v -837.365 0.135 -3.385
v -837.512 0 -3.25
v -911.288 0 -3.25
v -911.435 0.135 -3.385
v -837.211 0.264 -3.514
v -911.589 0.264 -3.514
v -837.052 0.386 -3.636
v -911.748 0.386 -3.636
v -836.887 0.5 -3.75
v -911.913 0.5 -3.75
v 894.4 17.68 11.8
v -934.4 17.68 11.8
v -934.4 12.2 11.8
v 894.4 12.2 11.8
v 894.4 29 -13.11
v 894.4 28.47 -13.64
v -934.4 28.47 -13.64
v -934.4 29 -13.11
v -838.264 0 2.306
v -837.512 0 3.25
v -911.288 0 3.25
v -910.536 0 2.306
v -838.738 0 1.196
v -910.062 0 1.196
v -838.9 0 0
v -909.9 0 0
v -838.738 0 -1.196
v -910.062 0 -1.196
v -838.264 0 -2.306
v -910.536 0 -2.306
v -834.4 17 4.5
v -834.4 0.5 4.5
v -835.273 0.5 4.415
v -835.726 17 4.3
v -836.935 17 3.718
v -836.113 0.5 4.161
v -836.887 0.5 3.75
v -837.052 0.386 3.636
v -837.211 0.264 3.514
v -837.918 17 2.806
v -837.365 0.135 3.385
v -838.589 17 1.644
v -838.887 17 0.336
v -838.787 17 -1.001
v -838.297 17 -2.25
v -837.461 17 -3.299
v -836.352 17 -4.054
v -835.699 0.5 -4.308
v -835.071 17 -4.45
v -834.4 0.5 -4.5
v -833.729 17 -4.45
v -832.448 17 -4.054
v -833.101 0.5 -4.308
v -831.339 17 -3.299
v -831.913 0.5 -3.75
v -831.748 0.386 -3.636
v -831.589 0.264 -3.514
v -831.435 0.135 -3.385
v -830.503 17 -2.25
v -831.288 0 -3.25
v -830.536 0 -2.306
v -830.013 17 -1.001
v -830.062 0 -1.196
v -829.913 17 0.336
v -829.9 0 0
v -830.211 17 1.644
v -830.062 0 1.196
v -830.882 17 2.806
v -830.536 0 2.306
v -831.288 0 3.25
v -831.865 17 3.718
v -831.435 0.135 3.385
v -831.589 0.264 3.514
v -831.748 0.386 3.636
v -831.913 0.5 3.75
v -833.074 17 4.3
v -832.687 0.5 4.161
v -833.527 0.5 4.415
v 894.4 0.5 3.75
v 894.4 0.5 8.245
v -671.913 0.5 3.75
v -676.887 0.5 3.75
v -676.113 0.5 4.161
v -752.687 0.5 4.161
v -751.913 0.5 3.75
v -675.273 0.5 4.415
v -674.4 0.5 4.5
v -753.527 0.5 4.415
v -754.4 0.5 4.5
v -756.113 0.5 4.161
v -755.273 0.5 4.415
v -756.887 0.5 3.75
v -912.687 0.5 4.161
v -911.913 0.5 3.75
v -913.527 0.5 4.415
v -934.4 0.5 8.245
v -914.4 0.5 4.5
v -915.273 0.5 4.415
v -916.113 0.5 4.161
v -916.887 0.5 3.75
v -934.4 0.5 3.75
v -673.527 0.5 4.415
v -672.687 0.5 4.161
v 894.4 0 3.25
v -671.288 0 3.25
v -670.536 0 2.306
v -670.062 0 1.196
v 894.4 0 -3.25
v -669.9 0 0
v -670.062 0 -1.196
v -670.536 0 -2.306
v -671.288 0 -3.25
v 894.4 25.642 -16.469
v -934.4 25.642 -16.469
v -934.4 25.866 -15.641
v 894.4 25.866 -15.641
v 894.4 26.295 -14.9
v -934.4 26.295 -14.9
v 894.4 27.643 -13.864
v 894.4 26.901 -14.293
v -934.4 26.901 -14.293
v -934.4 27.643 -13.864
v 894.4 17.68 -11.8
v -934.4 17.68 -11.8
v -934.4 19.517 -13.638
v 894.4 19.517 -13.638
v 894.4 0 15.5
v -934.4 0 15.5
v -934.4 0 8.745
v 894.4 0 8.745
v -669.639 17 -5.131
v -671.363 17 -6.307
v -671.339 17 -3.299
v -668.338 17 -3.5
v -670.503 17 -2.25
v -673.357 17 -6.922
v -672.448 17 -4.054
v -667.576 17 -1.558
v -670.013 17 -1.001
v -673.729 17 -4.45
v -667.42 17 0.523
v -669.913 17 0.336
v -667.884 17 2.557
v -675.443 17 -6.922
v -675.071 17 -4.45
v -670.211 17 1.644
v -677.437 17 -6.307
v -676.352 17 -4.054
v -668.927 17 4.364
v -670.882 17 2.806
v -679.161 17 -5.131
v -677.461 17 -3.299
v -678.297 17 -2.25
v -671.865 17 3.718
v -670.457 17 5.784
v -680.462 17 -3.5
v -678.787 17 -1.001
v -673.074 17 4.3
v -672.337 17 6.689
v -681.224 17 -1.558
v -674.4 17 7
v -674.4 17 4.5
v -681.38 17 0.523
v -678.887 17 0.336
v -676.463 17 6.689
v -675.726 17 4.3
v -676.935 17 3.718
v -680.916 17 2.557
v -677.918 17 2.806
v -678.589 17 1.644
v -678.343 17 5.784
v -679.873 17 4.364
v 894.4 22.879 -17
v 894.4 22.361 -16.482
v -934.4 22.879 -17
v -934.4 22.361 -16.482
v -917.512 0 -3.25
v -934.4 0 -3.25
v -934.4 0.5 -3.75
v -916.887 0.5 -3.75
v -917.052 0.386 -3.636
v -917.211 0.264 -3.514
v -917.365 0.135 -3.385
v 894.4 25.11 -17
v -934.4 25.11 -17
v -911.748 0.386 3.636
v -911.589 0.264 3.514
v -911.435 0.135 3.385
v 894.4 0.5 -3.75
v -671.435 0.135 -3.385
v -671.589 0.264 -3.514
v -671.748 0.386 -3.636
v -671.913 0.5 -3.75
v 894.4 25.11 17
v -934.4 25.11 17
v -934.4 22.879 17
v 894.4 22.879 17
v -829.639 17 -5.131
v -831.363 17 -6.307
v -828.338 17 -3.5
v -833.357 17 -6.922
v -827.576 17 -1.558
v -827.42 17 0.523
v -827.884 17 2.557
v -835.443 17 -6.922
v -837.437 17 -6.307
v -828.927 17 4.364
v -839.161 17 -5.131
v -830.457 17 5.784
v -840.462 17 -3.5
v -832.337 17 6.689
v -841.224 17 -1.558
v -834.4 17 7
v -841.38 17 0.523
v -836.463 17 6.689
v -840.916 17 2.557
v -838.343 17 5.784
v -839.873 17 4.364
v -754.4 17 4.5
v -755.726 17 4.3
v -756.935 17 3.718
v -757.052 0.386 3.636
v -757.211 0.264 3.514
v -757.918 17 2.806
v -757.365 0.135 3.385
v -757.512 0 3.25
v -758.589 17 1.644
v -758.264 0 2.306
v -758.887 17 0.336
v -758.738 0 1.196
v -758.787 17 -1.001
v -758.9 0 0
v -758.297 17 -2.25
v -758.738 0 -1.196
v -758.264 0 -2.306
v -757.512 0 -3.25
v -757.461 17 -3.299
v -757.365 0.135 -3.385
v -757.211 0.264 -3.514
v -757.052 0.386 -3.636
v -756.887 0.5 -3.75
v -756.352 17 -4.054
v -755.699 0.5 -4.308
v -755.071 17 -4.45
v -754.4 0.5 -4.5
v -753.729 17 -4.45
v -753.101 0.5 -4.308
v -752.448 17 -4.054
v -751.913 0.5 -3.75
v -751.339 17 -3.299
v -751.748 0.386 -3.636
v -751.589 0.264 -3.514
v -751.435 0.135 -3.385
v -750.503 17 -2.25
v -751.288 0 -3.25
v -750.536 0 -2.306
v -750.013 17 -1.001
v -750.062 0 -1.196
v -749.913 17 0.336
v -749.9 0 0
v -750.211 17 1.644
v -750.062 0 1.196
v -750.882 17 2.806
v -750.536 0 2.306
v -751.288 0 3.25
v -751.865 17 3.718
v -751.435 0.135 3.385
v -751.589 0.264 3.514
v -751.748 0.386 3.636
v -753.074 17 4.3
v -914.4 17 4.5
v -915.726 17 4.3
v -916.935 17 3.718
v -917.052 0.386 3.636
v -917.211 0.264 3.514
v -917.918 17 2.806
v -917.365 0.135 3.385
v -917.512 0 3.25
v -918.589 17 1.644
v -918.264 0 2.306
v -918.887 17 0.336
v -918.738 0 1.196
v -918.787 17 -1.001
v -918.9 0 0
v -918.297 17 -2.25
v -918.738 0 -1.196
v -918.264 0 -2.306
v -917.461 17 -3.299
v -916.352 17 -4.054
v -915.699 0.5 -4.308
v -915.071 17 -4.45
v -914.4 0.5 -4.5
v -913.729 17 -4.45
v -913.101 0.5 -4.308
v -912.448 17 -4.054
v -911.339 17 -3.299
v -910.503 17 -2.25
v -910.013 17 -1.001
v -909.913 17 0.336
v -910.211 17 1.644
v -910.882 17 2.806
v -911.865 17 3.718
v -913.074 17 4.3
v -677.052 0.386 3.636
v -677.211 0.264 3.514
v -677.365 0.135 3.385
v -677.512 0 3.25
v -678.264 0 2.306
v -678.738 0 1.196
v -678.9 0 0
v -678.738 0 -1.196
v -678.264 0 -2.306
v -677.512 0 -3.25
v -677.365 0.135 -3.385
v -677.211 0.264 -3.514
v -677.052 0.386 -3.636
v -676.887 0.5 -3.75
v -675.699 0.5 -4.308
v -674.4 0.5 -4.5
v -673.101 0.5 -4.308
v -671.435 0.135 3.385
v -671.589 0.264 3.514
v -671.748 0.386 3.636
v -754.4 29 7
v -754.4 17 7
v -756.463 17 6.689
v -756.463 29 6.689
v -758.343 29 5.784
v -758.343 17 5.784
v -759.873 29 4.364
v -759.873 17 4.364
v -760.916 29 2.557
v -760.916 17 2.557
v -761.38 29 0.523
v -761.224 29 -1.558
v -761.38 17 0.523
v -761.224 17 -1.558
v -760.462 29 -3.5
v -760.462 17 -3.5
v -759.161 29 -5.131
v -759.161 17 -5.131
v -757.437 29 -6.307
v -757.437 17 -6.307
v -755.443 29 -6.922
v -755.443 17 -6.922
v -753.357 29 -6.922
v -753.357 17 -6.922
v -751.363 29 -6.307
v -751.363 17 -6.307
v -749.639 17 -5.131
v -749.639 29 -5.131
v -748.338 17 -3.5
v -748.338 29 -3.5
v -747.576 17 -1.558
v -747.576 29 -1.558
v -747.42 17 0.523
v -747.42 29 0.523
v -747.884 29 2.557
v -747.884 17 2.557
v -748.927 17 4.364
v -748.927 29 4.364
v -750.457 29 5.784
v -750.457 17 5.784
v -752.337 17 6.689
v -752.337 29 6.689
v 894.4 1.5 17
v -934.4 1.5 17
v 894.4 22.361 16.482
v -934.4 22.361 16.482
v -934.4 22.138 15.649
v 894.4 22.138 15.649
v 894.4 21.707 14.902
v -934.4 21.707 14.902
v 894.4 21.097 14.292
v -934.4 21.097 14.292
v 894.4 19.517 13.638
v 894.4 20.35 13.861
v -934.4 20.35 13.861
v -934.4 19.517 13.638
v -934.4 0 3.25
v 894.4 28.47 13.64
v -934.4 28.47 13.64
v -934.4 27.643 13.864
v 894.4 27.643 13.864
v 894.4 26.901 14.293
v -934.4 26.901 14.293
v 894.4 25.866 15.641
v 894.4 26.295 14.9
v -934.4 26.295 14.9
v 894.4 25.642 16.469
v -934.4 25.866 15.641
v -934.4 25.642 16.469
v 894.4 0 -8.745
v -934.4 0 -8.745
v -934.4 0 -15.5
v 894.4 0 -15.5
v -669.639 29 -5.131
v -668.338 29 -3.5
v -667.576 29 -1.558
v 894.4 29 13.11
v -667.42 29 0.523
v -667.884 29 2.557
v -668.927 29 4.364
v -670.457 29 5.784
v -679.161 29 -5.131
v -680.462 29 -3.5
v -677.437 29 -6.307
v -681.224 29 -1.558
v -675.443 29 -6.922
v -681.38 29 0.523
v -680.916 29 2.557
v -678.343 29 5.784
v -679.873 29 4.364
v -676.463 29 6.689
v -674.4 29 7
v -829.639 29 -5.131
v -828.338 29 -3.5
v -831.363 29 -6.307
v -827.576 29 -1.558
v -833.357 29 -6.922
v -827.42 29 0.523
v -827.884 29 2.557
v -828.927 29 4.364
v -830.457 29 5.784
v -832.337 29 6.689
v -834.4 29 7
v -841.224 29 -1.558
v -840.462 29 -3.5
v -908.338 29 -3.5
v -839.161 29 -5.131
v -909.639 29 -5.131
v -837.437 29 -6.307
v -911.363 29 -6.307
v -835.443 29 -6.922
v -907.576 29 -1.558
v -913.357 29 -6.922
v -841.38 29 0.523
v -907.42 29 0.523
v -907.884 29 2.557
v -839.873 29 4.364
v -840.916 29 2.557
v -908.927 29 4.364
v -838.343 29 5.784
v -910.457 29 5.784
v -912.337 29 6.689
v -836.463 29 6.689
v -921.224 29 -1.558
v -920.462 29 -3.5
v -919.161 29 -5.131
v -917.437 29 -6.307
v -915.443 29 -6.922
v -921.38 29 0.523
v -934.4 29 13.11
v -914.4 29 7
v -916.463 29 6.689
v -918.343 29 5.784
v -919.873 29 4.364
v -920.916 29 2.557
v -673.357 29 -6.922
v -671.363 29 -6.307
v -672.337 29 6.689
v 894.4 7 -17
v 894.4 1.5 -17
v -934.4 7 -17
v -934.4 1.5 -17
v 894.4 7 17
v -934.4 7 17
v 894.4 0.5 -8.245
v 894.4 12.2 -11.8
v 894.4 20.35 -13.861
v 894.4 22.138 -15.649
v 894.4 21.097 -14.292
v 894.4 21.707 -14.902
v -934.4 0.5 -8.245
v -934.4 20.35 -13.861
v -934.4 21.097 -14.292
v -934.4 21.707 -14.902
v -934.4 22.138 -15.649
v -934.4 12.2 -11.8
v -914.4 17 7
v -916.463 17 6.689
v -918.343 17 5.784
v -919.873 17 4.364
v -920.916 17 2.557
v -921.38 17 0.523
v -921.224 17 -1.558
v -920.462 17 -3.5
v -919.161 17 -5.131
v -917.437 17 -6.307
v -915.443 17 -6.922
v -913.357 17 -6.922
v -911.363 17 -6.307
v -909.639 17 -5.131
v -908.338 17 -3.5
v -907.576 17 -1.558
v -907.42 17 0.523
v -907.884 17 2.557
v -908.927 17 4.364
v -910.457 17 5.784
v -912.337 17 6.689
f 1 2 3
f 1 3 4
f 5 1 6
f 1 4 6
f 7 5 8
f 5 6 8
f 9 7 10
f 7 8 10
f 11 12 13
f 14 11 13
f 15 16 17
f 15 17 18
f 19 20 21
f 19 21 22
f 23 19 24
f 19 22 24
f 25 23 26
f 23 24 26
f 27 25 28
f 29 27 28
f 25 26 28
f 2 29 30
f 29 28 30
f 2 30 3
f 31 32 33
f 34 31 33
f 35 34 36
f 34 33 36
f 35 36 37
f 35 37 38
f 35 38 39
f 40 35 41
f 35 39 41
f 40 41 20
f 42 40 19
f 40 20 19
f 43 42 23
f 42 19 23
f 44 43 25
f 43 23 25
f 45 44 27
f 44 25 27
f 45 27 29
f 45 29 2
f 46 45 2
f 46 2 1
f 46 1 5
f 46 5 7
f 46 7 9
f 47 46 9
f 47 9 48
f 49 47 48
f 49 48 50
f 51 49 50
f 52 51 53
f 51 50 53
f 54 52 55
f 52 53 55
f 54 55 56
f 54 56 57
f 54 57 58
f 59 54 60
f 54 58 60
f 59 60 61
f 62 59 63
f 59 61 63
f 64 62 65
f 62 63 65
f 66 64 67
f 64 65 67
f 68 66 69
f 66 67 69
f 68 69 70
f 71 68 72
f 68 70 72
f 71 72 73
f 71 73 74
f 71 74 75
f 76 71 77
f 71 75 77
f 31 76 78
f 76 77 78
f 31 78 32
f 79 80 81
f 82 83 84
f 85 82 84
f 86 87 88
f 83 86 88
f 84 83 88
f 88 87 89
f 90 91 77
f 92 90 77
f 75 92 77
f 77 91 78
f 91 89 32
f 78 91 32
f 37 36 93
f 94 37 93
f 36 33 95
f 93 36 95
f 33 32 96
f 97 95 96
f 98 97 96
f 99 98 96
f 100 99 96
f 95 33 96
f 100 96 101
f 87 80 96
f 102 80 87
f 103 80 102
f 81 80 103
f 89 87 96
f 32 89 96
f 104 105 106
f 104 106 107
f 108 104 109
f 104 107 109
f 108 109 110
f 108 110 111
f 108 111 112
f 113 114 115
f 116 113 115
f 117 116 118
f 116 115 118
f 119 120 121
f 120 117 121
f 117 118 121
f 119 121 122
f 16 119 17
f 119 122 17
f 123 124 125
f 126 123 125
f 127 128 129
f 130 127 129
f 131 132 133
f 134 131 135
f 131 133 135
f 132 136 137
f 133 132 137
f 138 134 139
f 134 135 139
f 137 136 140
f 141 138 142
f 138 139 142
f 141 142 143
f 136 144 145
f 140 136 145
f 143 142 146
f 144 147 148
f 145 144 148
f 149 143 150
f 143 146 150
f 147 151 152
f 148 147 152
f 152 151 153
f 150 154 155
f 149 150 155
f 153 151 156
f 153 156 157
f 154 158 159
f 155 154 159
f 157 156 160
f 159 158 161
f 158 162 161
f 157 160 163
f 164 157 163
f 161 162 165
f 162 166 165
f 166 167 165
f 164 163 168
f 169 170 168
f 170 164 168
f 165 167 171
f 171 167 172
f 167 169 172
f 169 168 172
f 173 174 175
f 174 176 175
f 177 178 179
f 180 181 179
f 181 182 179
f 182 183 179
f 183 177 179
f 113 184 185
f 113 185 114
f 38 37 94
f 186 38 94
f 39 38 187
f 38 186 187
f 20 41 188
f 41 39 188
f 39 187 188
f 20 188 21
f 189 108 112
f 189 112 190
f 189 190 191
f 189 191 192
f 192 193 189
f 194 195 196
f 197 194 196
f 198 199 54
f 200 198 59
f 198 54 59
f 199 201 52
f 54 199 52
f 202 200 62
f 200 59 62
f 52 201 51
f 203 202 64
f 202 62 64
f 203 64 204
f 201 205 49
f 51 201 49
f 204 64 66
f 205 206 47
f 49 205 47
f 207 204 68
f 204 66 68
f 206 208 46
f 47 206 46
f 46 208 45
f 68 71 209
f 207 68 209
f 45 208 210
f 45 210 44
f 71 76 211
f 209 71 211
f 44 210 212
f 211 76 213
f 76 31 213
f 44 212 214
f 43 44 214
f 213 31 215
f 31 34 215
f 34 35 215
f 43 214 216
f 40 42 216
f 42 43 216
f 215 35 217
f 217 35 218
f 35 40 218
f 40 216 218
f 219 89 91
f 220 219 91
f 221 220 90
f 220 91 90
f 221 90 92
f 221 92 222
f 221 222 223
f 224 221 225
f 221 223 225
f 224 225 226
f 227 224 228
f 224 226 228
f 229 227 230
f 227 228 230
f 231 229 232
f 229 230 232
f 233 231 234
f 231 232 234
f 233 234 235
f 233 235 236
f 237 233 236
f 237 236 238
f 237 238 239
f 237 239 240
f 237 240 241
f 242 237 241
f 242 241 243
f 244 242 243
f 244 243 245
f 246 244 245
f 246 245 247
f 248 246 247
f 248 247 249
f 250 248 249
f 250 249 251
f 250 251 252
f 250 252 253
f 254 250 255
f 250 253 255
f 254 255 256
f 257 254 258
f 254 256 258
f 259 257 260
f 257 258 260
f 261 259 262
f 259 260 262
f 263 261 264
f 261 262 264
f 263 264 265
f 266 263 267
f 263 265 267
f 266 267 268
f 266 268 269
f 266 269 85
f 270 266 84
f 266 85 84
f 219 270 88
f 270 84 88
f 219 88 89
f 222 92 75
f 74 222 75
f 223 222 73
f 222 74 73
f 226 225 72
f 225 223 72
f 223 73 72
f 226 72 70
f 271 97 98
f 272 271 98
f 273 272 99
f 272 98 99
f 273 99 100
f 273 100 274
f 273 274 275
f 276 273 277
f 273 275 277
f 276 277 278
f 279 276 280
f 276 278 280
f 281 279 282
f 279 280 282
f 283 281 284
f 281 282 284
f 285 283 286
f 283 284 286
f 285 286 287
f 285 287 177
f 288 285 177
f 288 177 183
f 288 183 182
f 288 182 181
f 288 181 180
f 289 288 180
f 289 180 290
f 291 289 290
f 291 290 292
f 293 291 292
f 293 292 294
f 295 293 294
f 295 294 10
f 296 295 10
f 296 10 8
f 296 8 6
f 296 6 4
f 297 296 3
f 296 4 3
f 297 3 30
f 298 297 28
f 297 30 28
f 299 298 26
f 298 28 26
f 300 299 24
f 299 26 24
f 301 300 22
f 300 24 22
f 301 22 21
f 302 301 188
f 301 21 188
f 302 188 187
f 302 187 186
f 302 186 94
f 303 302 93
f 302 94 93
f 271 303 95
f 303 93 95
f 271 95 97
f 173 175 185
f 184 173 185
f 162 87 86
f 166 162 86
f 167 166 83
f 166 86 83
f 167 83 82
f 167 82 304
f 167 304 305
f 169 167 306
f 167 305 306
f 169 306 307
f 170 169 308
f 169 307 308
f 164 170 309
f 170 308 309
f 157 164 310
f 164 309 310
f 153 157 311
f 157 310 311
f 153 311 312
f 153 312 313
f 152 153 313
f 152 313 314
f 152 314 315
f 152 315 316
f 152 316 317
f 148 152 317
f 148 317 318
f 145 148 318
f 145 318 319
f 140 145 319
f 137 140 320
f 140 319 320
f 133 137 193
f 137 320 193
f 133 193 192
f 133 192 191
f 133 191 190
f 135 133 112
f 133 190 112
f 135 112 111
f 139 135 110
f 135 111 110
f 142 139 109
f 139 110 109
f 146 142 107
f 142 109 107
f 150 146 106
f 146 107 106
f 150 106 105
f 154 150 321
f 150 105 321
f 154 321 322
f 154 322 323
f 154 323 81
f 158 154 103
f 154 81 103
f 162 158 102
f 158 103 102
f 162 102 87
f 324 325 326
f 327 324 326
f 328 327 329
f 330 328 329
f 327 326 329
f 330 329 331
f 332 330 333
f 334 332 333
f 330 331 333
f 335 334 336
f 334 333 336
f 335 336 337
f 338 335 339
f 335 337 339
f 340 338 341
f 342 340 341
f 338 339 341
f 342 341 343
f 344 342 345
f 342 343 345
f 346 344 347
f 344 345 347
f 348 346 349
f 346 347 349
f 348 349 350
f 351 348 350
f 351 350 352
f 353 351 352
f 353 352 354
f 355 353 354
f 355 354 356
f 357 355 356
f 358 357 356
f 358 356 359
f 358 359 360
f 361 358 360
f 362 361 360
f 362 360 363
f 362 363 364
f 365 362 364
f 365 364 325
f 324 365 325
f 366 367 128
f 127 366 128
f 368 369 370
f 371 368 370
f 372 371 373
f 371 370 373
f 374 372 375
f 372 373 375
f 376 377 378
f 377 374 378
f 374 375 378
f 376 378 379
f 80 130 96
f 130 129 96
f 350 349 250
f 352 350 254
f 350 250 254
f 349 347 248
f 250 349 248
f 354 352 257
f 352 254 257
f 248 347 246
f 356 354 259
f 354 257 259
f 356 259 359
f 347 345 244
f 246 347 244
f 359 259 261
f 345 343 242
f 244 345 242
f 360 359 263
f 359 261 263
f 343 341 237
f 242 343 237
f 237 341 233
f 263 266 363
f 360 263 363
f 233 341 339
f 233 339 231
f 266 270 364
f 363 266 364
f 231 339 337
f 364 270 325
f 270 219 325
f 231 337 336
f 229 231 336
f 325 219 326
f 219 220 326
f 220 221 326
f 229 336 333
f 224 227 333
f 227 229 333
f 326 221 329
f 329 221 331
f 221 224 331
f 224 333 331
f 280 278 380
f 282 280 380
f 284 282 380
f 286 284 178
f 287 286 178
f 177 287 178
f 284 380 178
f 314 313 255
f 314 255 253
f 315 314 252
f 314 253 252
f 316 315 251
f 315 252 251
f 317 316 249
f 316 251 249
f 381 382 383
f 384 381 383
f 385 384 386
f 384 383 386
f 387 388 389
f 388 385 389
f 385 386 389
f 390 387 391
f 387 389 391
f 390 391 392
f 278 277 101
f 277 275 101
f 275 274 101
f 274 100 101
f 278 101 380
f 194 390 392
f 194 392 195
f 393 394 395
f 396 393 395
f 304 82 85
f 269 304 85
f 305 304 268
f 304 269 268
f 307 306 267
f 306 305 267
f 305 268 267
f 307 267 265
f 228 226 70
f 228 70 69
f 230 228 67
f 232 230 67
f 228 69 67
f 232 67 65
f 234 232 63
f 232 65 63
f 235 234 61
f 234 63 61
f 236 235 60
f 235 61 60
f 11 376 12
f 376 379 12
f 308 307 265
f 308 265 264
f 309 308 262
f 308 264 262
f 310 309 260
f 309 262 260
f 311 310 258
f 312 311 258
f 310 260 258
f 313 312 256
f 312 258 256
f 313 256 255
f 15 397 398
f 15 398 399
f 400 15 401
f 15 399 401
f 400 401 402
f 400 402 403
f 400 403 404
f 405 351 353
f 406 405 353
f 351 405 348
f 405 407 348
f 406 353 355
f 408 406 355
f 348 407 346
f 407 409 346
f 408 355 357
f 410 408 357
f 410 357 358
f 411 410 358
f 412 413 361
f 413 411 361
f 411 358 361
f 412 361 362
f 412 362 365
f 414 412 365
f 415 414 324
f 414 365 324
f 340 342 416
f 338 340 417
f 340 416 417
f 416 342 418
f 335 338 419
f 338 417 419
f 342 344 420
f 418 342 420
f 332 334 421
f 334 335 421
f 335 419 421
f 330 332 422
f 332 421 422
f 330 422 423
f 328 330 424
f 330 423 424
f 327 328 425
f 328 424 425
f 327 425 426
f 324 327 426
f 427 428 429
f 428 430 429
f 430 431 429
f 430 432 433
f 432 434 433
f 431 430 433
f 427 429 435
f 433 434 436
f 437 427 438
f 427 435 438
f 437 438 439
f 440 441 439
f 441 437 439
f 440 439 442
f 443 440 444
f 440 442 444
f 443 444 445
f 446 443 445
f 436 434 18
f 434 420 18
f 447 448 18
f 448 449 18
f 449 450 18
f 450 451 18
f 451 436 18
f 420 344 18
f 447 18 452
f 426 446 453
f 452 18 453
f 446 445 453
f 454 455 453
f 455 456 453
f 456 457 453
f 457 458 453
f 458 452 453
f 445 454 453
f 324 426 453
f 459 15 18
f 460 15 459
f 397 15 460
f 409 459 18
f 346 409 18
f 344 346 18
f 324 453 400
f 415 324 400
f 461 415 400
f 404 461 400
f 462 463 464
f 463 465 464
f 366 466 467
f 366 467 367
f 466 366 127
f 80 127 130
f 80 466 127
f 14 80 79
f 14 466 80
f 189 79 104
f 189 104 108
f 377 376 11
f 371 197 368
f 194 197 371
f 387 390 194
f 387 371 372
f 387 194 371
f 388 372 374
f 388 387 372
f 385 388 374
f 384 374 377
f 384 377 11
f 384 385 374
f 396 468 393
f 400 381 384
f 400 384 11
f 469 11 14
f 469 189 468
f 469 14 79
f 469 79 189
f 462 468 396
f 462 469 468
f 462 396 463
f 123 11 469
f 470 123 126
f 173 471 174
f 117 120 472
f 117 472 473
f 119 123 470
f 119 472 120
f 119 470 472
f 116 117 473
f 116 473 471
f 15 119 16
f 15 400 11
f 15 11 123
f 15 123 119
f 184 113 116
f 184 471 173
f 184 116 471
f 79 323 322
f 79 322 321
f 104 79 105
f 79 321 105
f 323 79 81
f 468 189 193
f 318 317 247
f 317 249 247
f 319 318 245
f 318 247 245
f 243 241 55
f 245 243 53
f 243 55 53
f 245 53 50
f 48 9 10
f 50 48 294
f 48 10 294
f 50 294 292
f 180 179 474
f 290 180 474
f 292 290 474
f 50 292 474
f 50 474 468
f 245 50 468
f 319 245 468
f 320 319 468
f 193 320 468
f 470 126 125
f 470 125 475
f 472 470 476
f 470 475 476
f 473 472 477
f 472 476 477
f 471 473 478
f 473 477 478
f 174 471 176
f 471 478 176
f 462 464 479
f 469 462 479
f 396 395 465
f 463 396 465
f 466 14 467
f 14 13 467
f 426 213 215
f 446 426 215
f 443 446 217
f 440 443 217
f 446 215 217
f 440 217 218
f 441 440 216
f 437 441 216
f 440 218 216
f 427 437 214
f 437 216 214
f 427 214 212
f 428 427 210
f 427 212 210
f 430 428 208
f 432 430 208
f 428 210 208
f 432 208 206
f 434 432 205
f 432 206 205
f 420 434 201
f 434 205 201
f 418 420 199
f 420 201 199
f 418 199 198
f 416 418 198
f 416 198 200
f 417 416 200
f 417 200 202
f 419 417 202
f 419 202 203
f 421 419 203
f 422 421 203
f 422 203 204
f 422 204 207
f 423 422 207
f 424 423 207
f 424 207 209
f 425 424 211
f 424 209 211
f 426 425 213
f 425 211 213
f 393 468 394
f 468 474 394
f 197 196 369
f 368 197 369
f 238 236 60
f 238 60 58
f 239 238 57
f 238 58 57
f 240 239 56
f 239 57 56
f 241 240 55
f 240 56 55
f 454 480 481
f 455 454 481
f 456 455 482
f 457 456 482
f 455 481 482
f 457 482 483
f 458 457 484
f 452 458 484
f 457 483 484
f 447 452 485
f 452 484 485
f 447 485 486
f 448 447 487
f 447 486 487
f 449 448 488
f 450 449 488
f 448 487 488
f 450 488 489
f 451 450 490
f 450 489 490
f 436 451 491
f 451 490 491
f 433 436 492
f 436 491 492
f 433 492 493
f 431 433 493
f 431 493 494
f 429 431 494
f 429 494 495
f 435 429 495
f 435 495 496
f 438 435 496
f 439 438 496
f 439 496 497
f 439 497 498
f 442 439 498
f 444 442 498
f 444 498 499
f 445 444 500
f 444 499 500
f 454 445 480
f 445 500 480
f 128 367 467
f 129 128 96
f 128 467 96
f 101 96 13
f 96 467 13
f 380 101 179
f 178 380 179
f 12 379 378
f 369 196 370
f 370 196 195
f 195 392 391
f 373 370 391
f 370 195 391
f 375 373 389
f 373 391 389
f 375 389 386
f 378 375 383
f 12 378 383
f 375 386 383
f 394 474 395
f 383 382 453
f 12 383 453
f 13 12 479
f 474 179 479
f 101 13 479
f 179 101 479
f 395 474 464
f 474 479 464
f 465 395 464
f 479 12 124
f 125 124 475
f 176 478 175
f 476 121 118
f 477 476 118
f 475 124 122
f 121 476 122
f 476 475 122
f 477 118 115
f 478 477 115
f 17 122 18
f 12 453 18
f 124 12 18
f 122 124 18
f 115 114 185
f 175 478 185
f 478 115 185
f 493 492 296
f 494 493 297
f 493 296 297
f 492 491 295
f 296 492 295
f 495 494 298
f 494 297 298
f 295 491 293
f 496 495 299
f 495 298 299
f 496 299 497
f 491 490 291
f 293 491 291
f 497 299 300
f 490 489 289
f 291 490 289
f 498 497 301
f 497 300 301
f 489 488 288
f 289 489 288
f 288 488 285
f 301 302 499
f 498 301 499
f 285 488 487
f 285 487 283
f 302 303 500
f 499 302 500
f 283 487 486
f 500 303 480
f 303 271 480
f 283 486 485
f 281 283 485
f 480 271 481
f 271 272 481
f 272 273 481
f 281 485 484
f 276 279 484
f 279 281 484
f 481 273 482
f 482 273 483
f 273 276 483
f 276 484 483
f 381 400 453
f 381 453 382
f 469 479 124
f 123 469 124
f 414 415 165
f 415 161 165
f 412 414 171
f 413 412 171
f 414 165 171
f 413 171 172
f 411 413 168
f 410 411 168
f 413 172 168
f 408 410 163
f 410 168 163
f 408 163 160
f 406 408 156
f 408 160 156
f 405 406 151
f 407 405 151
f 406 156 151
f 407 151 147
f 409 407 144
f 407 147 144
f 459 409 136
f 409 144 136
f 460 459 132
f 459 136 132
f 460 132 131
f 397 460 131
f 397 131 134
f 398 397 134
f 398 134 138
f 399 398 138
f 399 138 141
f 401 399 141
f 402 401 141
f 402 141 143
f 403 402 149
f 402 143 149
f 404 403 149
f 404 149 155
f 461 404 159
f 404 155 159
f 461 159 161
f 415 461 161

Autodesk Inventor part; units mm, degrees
sketch "Sketch_18" plane through (-20, 0, 0) normal (1, 0, 0) x (0, 0, -1)
  line L0 (-17, 1.5) -> (-15.5, 0)
  line L1 (-15.5, 0) -> (-8.745, 0)
  line L2 (-8.745, 0) -> (-8.245, 0.5)
  line L3 (-8.245, 0.5) -> (-3.75, 0.5)
  line L4 (-3.75, 0.5) -> (-3.25, 0)
  line L5 (-3.25, 0) -> (3.25, 0)
  line L6 (3.25, 0) -> (3.75, 0.5)
  line L7 (3.75, 0.5) -> (8.245, 0.5)
  line L8 (8.245, 0.5) -> (8.745, 0)
  line L9 (8.745, 0) -> (15.5, 0)
  line L10 (15.5, 0) -> (17, 1.5)
  line L11 (17, 1.5) -> (17, 7.0002)
  line L12 (17, 7.0002) -> (11.8003, 12.1999)
  line L13 (11.8003, 12.1999) -> (11.8003, 17.6796)
  line L14 (11.8003, 17.6796) -> (13.6381, 19.5174)
  arc A0 (16.4816, 22.3609) -> (13.6381, 19.5174) centre (16.9102, 19.0889) ccw
  line L15 (16.4816, 22.3609) -> (17, 22.8793)
  line L16 (17, 22.8793) -> (17, 25.1102)
  line L17 (17, 25.1102) -> (16.4686, 25.6415)
  arc A1 (13.6398, 28.4703) -> (16.4686, 25.6415) centre (16.9102, 28.9119) ccw
  line L18 (13.6398, 28.4703) -> (13.1102, 29)
  line L19 (13.1102, 29) -> (-13.1102, 29)
  line L20 (-13.1102, 29) -> (-13.6398, 28.4703)
  arc A2 (-16.4686, 25.6415) -> (-13.6398, 28.4703) centre (-16.9102, 28.9119) ccw
  line L21 (-16.4686, 25.6415) -> (-17, 25.1102)
  line L22 (-17, 25.1102) -> (-17, 22.8793)
  line L23 (-17, 22.8793) -> (-16.4816, 22.3609)
  arc A3 (-13.6381, 19.5174) -> (-16.4816, 22.3609) centre (-16.9102, 19.0889) ccw
  line L24 (-13.6381, 19.5174) -> (-11.8003, 17.6796)
  line L25 (-11.8003, 17.6796) -> (-11.8003, 12.1999)
  line L26 (-11.8003, 12.1999) -> (-17, 7.0002)
  line L27 (-17, 7.0002) -> (-17, 1.5)
extrude "Extrusion1" add sketch "Sketch_18" along normal mid plane 1828.8
sketch "Sketch2" plane through (-934.4, 29, 13.1102) normal (0, 1, 0) x (1, 0, 0)
  point P0 (20, 13.1102)
hole "Hole1" at (-914.4, 29, 0) direction (0, -1, 0) diameter 9 depth 29 counterbore diameter 14 counterbore depth 12
pattern_linear "Rectangular Pattern1" count 4 spacing 80 along (1, 0, 0) of "Hole1"
ref_plane "4dummy_XY" through (0, 0, 0) normal (1, 0, 0) x (0, 0, -1)
ref_plane "4dummy_YZ" through (0, 0, 0) normal (0, 0, -1) x (0, 1, 0)
ref_plane "4dummy_ZX" through (0, 0, 0) normal (0, 1, 0) x (1, 0, 0)
ref_plane "4slide_XY" through (-20, 7.5, 0) normal (1, 0, 0) x (0, 0, -1)
ref_plane "4slide_YZ" through (-20, 7.5, 0) normal (0, 0, -1) x (0, 1, 0)
ref_plane "4slide_ZX" through (-20, 7.5, 0) normal (0, 1, 0) x (1, 0, 0)
ref_plane "4track_XY" through (0, 0, 0) normal (0, 0, 1) x (1, 0, 0)
ref_plane "4track_YZ" through (0, 0, 0) normal (1, 0, 0) x (0, 1, 0)
ref_plane "4track_ZX" through (0, 0, 0) normal (0, 1, 0) x (0, 0, 1)
properties part number "HSR35R128020 Rail"
